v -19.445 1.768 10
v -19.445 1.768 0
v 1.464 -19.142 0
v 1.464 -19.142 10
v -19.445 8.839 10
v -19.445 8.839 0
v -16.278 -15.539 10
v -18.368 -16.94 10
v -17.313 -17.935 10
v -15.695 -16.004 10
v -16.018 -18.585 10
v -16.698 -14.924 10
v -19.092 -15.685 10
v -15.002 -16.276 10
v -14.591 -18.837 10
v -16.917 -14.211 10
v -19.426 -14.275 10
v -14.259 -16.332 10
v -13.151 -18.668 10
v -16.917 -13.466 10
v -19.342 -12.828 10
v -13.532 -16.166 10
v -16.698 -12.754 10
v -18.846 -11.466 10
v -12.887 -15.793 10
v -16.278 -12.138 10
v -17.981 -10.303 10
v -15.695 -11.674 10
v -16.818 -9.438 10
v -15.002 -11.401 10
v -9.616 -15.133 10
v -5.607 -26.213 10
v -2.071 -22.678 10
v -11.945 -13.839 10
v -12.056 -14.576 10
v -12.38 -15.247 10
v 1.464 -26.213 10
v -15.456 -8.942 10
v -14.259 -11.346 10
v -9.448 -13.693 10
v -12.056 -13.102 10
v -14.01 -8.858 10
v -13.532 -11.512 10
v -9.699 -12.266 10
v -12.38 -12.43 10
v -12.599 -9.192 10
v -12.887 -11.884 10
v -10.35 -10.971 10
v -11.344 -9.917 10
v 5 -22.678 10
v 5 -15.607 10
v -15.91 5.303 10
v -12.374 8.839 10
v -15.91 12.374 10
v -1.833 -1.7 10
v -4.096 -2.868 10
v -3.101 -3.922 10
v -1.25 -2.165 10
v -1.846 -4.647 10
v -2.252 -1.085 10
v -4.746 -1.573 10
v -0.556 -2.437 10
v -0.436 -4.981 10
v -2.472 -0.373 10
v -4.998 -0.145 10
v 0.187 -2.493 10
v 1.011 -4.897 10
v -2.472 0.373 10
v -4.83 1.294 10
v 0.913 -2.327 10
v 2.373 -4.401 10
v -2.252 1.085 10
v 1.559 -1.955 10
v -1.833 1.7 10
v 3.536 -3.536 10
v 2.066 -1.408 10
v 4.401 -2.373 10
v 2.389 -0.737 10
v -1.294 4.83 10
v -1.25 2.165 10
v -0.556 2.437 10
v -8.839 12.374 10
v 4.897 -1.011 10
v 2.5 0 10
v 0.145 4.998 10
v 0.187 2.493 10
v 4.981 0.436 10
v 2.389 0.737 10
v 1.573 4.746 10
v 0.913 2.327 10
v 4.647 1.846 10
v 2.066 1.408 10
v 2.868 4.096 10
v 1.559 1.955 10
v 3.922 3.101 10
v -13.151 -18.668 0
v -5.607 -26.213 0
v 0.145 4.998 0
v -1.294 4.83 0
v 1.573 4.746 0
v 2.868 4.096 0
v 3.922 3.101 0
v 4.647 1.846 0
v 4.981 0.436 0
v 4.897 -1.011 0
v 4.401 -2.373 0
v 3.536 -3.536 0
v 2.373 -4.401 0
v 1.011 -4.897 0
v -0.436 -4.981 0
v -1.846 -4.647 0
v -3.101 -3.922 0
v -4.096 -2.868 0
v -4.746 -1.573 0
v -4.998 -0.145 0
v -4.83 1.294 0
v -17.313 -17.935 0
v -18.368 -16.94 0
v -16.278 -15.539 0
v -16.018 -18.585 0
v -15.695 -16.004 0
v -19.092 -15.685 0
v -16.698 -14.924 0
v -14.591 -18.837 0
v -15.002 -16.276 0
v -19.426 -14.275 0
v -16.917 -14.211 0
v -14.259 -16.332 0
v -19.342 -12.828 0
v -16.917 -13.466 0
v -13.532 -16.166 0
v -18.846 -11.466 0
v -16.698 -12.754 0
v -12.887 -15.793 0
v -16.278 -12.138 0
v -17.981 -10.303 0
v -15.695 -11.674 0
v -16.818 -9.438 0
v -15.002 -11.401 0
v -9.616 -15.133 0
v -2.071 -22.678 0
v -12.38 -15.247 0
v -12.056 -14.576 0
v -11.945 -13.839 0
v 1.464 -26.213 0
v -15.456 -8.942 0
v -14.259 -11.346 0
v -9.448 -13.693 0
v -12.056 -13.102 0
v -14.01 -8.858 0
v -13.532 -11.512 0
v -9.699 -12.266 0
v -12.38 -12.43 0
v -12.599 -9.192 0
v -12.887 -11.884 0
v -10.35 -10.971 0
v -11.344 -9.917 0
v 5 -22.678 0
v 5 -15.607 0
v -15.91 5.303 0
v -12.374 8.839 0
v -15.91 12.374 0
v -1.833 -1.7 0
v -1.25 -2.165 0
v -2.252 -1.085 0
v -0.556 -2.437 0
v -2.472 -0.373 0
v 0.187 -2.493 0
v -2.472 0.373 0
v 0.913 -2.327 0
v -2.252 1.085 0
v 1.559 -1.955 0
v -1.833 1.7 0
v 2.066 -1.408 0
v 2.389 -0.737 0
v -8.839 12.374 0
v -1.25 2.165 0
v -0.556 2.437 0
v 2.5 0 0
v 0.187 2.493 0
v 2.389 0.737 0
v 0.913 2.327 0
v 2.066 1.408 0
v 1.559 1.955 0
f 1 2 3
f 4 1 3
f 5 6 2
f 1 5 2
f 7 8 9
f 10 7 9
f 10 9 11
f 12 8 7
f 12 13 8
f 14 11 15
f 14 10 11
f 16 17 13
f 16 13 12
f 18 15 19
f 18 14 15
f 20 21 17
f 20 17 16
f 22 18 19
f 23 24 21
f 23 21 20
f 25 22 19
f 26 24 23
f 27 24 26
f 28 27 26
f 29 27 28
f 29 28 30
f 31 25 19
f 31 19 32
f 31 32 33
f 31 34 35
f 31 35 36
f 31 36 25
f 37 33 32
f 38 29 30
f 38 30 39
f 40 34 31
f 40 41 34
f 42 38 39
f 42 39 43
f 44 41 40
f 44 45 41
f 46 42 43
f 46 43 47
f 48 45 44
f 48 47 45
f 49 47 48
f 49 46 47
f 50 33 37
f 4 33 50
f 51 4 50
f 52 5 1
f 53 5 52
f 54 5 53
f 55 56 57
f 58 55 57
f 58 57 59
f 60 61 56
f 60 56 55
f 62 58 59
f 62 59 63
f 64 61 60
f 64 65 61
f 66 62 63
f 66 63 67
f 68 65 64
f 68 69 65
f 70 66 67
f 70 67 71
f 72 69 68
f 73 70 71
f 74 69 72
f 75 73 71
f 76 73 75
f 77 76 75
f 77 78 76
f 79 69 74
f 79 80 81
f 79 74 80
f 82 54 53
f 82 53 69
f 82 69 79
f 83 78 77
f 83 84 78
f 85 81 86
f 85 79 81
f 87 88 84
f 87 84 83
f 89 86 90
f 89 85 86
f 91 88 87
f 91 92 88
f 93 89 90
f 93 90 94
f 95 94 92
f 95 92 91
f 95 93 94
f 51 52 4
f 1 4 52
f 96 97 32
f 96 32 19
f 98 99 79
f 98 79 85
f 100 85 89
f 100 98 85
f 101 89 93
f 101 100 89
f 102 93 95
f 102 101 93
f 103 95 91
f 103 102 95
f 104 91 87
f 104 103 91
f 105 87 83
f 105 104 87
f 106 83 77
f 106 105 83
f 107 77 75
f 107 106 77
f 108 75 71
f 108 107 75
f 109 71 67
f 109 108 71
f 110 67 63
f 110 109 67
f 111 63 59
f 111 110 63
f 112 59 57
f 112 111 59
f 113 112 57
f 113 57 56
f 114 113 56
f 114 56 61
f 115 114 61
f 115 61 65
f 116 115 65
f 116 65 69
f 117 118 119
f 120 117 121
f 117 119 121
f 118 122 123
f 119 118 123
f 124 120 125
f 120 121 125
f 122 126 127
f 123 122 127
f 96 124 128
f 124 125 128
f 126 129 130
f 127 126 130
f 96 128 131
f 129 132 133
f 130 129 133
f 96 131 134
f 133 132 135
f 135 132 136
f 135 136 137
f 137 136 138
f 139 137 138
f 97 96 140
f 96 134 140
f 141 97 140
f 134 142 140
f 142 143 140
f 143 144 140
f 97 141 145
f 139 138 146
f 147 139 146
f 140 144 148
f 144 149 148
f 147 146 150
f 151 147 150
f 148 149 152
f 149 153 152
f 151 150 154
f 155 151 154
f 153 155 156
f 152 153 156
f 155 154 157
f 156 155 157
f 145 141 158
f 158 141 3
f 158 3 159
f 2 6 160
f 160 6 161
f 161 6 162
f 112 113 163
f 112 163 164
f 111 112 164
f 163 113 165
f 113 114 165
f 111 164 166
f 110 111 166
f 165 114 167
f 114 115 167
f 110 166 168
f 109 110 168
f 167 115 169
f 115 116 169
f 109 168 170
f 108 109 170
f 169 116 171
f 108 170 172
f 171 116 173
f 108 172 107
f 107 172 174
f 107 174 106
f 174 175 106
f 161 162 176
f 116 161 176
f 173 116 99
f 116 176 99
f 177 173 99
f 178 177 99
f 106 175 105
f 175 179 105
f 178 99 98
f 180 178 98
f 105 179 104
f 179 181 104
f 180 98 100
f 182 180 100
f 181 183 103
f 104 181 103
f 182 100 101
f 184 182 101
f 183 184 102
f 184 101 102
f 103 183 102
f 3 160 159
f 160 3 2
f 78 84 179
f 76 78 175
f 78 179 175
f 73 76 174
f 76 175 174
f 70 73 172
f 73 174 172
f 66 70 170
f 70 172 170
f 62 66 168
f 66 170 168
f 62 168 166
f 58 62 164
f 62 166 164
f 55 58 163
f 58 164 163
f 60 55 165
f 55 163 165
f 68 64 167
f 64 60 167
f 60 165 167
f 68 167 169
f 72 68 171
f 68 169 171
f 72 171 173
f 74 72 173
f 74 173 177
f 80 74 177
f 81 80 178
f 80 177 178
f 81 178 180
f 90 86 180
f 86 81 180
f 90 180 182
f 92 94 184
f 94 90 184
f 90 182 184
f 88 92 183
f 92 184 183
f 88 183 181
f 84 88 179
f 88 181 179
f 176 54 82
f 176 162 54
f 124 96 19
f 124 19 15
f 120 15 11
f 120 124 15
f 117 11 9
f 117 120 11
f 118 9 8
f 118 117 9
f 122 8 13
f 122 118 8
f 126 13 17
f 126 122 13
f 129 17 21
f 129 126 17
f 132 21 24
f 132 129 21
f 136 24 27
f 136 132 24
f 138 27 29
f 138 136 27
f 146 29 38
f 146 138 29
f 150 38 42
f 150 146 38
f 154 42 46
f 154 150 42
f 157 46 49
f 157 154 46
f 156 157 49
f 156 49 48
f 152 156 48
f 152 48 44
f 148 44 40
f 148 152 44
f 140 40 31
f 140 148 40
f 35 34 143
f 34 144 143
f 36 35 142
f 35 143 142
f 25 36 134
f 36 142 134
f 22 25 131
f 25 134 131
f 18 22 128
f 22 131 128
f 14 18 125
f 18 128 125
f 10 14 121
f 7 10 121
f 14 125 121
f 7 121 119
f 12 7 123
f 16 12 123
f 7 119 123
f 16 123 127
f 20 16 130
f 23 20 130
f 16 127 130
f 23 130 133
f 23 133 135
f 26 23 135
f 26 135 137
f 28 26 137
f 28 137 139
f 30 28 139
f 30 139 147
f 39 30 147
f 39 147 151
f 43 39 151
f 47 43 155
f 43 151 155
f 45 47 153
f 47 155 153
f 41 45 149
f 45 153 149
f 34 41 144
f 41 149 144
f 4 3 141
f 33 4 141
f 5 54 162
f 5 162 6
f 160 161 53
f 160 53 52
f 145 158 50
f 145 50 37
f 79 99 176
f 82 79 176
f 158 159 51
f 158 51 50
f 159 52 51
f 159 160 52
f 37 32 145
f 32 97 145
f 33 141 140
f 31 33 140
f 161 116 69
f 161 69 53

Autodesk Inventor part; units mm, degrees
ref_plane "YZ Plane" through (0, 0, 0) normal (1, 0, 0) x (0, 1, 0)
ref_plane "XZ Plane" through (0, 0, 0) normal (0, 1, 0) x (-1, 0, 0)
ref_plane "XY Plane" through (0, 0, 0) normal (0, 0, 1) x (1, 0, 0)
sketch "Sketch1" plane through (0, 0, 0) normal (0, 0, 1) x (1, 0, 0)
  circle A0 centre (0, 0) radius 2.5
  circle A1 centre (0, 0) radius 5
  line L0 (-1.7678, -1.7678) -> (-12.3744, 8.8388)
  line L1 (-12.3744, 8.8388) -> (-15.9099, 5.3033)
  line L2 (-15.9099, 5.3033) -> (5, -15.6066)
  line L3 (5, -15.6066) -> (5, -22.6777)
  line L4 (5, -22.6777) -> (1.4645, -26.2132)
  line L5 (-5.6066, -26.2132) -> (-16.2132, -15.6066)
  line L6 (1.7678, 1.7678) -> (-8.8388, 12.3744)
  line L7 (-15.9099, 12.3744) -> (-19.4454, 8.8388)
  line L8 (-19.4454, 8.8388) -> (-19.4454, 1.7678)
  line L9 (-19.4454, 1.7678) -> (1.4645, -19.1421)
  line L10 (1.4645, -19.1421) -> (-2.0711, -22.6777)
  line L11 (-2.0711, -22.6777) -> (-12.6777, -12.0711)
  line L12 (-12.6777, -12.0711) -> (-16.2132, -15.6066)
  line L13 (-1.7678, -1.7678) -> (1.7678, 1.7678)
  circle A2 centre (-14.4454, -13.8388) radius 2.5
  circle A3 centre (-14.4454, -13.8388) radius 5
  line L14 (-15.9099, 12.3744) -> (-8.8388, 12.3744)
  line L15 (-5.6066, -26.2132) -> (1.4645, -26.2132)
  dimension "d0" = 5
  dimension "d1" = 10
  dimension "d3" = 90
  dimension "d6" = 135
  dimension "d7" = 135
  dimension "d8" = 90
  dimension "d9" = 5
  dimension "d12" = 10
  dimension "d13" = 15
  dimension "d14" = 15
  dimension "d31" = 7.0711
  dimension "d32" = 15
  dimension "d33" = 7.0711
  dimension "d34" = 15
  dimension "d35" = 7.0711
  dimension "d36" = 7.0711
  dimension "d37" = 5
  dimension "d38" = 90
  dimension "d39" = 135
  dimension "d40" = 5
  dimension "d41" = 5
extrude "Extrusion10" add sketch "Sketch1" along normal blind 10 contours A0 L6 A1 L0 | A0 L0 A1 L6 | A1 L0 L1 L2 L3 L4 L15 L5 A3 L11 L10 L9 L8 L7 L14 L6 | A3 L5 A2 L11 | L11 A2 L5 A3 | A2 L12 picked at (-13.4317, -14.7545)
sketch "Sketch6" plane through (0, 0, 10) normal (0, 0, 1) x (1, 0, 0)
  line L0 (-1.2941, 4.8296) -> (-8.8388, 12.3744) projected
  line L1 (-8.8388, 12.3744) -> (-15.9099, 12.3744) projected
  line L2 (-15.9099, 12.3744) -> (-19.4454, 8.8388) projected
  line L3 (-19.4454, 8.8388) -> (-19.4454, 1.7678) projected
  line L4 (-19.4454, 1.7678) -> (1.4645, -19.1421) projected
  line L5 (1.4645, -19.1421) -> (-2.0711, -22.6777) projected
  line L6 (-2.0711, -22.6777) -> (-9.6158, -15.1329) projected
  arc A0 (-9.6158, -15.1329) -> (-13.1513, -18.6685) centre (-14.4454, -13.8388) ccw projected
  line L7 (-13.1513, -18.6685) -> (-5.6066, -26.2132) projected
  line L8 (-5.6066, -26.2132) -> (1.4645, -26.2132) projected
  line L9 (1.4645, -26.2132) -> (5, -22.6777) projected
  line L10 (5, -22.6777) -> (5, -15.6066) projected
  line L11 (5, -15.6066) -> (-15.9099, 5.3033) projected
  line L12 (-15.9099, 5.3033) -> (-12.3744, 8.8388) projected
  line L13 (-12.3744, 8.8388) -> (-4.8296, 1.2941) projected
  arc A1 (-4.8296, 1.2941) -> (-1.2941, 4.8296) centre (0, 0) ccw projected
  line L14 (-16.2132, -15.6066) -> (-12.6777, -12.0711) projected
  arc A2 (-12.6777, -12.0711) -> (-16.2132, -15.6066) centre (-14.4454, -13.8388) ccw projected
  circle A3 centre (0, 0) radius 2.5 projected
  circle A4 centre (-14.4454, -13.8388) radius 2.5
extrude "Extrusion11" cut sketch "Sketch6" against normal blind 10 contours L14 A4
equation "\"d1\" = 2 * d0"
equation "\"d9\" = d0"
equation "\"d12\" = d1"
equation "\"d13\" = 3 * d0"
equation "\"d14\" = d13"
properties part number "Sawaiz Logo Ribbon 4"
